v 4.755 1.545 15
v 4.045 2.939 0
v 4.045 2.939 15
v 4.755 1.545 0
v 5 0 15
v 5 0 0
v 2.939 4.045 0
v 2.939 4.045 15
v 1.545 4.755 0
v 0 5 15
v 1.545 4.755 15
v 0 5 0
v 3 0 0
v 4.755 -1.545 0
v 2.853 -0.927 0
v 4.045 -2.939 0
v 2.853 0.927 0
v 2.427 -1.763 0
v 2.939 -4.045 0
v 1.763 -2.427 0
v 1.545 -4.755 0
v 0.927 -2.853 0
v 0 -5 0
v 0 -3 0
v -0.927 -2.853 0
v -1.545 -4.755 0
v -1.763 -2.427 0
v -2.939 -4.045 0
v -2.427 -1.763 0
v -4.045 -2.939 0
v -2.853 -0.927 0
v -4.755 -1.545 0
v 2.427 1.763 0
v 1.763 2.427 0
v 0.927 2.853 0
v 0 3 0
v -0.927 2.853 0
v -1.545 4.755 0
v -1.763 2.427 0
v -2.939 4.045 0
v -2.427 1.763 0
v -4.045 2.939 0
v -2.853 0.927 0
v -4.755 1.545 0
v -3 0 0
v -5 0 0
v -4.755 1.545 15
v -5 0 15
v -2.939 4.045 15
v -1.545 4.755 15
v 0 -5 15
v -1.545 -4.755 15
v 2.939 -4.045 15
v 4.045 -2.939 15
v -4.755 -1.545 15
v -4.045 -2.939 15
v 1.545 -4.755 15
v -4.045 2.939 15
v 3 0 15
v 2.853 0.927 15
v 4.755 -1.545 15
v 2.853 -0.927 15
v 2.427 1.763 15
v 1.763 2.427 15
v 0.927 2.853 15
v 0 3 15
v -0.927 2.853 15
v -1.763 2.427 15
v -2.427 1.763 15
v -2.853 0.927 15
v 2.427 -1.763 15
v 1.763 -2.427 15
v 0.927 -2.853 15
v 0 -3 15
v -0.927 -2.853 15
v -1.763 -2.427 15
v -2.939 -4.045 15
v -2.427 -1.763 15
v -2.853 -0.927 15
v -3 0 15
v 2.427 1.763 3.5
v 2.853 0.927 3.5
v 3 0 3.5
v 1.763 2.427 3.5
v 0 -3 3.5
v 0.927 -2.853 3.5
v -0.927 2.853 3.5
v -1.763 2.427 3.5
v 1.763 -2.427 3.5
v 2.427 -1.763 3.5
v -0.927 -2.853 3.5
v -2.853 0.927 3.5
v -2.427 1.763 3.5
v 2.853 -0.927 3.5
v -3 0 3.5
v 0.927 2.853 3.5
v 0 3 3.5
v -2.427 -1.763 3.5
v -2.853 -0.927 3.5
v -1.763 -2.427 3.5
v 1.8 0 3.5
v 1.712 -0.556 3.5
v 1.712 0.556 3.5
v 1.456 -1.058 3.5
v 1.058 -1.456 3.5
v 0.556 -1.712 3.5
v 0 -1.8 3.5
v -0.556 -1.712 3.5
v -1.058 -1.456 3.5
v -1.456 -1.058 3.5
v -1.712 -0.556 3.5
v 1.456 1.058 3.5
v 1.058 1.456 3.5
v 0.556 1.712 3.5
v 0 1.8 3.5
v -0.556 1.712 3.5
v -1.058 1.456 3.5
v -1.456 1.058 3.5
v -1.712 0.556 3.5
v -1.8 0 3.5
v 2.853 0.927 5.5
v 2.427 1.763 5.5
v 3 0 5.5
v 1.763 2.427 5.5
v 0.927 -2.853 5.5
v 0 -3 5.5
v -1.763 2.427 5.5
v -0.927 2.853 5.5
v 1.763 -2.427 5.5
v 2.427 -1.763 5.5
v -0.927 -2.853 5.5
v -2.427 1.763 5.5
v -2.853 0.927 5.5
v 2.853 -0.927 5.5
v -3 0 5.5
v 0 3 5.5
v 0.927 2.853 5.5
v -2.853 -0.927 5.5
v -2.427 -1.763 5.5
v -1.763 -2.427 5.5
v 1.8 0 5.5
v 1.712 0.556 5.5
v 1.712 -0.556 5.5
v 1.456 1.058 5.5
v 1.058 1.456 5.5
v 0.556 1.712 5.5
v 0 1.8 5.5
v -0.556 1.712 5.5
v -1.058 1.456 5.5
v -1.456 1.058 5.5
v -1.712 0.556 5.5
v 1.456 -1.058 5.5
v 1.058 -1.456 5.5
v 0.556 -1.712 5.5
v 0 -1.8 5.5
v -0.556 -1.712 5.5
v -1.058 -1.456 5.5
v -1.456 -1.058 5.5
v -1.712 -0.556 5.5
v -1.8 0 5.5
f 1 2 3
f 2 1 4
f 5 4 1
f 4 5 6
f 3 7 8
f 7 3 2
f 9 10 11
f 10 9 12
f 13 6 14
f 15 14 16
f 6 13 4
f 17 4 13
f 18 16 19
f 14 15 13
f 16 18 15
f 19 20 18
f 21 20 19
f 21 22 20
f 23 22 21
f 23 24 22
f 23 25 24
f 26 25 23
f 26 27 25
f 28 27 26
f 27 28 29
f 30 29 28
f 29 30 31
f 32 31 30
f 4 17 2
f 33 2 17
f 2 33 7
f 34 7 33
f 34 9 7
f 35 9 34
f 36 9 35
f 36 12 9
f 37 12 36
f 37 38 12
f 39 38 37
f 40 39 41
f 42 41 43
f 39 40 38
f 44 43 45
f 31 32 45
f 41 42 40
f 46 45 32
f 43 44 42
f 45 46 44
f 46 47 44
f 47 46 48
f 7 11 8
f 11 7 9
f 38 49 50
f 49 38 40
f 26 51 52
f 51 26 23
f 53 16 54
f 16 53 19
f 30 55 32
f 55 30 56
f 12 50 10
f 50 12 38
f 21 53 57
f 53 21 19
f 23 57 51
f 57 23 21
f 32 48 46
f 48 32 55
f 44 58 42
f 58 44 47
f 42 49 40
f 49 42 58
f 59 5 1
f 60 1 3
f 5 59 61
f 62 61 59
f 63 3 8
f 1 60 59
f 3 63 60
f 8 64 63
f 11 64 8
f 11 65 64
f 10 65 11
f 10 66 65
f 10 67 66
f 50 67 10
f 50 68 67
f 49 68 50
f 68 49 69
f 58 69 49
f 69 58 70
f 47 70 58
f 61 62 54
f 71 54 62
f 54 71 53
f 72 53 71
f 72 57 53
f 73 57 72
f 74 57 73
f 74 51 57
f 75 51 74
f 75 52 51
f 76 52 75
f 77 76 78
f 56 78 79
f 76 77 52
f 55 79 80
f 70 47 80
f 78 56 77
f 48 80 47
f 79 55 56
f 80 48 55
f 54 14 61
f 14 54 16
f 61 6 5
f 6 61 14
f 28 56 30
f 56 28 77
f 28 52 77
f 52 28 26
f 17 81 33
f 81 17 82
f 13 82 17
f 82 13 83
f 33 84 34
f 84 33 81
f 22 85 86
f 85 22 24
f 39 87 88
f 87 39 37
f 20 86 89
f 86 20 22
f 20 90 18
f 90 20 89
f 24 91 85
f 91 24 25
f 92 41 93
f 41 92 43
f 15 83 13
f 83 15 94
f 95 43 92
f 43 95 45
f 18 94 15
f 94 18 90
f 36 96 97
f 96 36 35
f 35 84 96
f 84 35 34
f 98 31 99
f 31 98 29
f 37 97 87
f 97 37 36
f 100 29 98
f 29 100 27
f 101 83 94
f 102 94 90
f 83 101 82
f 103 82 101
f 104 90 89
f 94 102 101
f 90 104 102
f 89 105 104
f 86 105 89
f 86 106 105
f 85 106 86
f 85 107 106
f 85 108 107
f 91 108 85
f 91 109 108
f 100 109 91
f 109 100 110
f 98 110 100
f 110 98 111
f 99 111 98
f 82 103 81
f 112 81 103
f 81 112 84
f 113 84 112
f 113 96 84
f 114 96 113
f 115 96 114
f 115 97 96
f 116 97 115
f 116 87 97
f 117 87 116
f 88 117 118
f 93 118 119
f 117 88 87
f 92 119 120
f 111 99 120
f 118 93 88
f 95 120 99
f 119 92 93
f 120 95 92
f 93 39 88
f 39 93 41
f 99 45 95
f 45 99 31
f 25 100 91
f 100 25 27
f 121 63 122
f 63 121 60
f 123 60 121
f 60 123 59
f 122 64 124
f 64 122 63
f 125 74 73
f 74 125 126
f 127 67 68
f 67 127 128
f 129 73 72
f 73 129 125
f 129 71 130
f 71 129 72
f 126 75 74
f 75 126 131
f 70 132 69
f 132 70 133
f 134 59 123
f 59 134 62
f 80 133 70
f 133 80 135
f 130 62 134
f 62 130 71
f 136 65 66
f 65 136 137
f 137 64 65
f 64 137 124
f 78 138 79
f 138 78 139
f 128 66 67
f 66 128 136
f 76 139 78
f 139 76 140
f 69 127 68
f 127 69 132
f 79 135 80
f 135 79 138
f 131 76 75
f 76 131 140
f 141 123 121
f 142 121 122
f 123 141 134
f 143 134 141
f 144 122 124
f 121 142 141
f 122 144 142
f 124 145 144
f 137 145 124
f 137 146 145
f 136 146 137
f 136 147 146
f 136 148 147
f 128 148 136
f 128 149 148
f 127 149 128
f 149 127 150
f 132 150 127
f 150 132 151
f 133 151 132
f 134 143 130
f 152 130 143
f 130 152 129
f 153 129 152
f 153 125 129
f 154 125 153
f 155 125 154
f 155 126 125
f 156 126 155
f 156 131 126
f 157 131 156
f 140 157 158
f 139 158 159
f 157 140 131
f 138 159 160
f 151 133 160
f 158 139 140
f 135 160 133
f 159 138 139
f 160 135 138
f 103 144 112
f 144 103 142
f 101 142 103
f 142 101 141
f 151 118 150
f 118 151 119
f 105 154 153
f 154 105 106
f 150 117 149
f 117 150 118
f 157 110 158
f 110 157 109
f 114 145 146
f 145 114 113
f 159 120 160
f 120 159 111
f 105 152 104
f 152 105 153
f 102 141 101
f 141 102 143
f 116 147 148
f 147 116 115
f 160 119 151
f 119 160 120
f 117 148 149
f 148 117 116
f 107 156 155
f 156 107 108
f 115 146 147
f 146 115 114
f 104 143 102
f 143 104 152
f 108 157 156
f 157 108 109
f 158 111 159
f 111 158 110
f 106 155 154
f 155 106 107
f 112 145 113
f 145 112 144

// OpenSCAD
$fn = 20;
difference() {
    cylinder(d = 10, h = 15);
    cylinder(d = 6, h = 3.5);
    translate([0,0,5.5])
    cylinder(d = 6, h = 15);
    cylinder(d = 3.6, h = 20);
}
